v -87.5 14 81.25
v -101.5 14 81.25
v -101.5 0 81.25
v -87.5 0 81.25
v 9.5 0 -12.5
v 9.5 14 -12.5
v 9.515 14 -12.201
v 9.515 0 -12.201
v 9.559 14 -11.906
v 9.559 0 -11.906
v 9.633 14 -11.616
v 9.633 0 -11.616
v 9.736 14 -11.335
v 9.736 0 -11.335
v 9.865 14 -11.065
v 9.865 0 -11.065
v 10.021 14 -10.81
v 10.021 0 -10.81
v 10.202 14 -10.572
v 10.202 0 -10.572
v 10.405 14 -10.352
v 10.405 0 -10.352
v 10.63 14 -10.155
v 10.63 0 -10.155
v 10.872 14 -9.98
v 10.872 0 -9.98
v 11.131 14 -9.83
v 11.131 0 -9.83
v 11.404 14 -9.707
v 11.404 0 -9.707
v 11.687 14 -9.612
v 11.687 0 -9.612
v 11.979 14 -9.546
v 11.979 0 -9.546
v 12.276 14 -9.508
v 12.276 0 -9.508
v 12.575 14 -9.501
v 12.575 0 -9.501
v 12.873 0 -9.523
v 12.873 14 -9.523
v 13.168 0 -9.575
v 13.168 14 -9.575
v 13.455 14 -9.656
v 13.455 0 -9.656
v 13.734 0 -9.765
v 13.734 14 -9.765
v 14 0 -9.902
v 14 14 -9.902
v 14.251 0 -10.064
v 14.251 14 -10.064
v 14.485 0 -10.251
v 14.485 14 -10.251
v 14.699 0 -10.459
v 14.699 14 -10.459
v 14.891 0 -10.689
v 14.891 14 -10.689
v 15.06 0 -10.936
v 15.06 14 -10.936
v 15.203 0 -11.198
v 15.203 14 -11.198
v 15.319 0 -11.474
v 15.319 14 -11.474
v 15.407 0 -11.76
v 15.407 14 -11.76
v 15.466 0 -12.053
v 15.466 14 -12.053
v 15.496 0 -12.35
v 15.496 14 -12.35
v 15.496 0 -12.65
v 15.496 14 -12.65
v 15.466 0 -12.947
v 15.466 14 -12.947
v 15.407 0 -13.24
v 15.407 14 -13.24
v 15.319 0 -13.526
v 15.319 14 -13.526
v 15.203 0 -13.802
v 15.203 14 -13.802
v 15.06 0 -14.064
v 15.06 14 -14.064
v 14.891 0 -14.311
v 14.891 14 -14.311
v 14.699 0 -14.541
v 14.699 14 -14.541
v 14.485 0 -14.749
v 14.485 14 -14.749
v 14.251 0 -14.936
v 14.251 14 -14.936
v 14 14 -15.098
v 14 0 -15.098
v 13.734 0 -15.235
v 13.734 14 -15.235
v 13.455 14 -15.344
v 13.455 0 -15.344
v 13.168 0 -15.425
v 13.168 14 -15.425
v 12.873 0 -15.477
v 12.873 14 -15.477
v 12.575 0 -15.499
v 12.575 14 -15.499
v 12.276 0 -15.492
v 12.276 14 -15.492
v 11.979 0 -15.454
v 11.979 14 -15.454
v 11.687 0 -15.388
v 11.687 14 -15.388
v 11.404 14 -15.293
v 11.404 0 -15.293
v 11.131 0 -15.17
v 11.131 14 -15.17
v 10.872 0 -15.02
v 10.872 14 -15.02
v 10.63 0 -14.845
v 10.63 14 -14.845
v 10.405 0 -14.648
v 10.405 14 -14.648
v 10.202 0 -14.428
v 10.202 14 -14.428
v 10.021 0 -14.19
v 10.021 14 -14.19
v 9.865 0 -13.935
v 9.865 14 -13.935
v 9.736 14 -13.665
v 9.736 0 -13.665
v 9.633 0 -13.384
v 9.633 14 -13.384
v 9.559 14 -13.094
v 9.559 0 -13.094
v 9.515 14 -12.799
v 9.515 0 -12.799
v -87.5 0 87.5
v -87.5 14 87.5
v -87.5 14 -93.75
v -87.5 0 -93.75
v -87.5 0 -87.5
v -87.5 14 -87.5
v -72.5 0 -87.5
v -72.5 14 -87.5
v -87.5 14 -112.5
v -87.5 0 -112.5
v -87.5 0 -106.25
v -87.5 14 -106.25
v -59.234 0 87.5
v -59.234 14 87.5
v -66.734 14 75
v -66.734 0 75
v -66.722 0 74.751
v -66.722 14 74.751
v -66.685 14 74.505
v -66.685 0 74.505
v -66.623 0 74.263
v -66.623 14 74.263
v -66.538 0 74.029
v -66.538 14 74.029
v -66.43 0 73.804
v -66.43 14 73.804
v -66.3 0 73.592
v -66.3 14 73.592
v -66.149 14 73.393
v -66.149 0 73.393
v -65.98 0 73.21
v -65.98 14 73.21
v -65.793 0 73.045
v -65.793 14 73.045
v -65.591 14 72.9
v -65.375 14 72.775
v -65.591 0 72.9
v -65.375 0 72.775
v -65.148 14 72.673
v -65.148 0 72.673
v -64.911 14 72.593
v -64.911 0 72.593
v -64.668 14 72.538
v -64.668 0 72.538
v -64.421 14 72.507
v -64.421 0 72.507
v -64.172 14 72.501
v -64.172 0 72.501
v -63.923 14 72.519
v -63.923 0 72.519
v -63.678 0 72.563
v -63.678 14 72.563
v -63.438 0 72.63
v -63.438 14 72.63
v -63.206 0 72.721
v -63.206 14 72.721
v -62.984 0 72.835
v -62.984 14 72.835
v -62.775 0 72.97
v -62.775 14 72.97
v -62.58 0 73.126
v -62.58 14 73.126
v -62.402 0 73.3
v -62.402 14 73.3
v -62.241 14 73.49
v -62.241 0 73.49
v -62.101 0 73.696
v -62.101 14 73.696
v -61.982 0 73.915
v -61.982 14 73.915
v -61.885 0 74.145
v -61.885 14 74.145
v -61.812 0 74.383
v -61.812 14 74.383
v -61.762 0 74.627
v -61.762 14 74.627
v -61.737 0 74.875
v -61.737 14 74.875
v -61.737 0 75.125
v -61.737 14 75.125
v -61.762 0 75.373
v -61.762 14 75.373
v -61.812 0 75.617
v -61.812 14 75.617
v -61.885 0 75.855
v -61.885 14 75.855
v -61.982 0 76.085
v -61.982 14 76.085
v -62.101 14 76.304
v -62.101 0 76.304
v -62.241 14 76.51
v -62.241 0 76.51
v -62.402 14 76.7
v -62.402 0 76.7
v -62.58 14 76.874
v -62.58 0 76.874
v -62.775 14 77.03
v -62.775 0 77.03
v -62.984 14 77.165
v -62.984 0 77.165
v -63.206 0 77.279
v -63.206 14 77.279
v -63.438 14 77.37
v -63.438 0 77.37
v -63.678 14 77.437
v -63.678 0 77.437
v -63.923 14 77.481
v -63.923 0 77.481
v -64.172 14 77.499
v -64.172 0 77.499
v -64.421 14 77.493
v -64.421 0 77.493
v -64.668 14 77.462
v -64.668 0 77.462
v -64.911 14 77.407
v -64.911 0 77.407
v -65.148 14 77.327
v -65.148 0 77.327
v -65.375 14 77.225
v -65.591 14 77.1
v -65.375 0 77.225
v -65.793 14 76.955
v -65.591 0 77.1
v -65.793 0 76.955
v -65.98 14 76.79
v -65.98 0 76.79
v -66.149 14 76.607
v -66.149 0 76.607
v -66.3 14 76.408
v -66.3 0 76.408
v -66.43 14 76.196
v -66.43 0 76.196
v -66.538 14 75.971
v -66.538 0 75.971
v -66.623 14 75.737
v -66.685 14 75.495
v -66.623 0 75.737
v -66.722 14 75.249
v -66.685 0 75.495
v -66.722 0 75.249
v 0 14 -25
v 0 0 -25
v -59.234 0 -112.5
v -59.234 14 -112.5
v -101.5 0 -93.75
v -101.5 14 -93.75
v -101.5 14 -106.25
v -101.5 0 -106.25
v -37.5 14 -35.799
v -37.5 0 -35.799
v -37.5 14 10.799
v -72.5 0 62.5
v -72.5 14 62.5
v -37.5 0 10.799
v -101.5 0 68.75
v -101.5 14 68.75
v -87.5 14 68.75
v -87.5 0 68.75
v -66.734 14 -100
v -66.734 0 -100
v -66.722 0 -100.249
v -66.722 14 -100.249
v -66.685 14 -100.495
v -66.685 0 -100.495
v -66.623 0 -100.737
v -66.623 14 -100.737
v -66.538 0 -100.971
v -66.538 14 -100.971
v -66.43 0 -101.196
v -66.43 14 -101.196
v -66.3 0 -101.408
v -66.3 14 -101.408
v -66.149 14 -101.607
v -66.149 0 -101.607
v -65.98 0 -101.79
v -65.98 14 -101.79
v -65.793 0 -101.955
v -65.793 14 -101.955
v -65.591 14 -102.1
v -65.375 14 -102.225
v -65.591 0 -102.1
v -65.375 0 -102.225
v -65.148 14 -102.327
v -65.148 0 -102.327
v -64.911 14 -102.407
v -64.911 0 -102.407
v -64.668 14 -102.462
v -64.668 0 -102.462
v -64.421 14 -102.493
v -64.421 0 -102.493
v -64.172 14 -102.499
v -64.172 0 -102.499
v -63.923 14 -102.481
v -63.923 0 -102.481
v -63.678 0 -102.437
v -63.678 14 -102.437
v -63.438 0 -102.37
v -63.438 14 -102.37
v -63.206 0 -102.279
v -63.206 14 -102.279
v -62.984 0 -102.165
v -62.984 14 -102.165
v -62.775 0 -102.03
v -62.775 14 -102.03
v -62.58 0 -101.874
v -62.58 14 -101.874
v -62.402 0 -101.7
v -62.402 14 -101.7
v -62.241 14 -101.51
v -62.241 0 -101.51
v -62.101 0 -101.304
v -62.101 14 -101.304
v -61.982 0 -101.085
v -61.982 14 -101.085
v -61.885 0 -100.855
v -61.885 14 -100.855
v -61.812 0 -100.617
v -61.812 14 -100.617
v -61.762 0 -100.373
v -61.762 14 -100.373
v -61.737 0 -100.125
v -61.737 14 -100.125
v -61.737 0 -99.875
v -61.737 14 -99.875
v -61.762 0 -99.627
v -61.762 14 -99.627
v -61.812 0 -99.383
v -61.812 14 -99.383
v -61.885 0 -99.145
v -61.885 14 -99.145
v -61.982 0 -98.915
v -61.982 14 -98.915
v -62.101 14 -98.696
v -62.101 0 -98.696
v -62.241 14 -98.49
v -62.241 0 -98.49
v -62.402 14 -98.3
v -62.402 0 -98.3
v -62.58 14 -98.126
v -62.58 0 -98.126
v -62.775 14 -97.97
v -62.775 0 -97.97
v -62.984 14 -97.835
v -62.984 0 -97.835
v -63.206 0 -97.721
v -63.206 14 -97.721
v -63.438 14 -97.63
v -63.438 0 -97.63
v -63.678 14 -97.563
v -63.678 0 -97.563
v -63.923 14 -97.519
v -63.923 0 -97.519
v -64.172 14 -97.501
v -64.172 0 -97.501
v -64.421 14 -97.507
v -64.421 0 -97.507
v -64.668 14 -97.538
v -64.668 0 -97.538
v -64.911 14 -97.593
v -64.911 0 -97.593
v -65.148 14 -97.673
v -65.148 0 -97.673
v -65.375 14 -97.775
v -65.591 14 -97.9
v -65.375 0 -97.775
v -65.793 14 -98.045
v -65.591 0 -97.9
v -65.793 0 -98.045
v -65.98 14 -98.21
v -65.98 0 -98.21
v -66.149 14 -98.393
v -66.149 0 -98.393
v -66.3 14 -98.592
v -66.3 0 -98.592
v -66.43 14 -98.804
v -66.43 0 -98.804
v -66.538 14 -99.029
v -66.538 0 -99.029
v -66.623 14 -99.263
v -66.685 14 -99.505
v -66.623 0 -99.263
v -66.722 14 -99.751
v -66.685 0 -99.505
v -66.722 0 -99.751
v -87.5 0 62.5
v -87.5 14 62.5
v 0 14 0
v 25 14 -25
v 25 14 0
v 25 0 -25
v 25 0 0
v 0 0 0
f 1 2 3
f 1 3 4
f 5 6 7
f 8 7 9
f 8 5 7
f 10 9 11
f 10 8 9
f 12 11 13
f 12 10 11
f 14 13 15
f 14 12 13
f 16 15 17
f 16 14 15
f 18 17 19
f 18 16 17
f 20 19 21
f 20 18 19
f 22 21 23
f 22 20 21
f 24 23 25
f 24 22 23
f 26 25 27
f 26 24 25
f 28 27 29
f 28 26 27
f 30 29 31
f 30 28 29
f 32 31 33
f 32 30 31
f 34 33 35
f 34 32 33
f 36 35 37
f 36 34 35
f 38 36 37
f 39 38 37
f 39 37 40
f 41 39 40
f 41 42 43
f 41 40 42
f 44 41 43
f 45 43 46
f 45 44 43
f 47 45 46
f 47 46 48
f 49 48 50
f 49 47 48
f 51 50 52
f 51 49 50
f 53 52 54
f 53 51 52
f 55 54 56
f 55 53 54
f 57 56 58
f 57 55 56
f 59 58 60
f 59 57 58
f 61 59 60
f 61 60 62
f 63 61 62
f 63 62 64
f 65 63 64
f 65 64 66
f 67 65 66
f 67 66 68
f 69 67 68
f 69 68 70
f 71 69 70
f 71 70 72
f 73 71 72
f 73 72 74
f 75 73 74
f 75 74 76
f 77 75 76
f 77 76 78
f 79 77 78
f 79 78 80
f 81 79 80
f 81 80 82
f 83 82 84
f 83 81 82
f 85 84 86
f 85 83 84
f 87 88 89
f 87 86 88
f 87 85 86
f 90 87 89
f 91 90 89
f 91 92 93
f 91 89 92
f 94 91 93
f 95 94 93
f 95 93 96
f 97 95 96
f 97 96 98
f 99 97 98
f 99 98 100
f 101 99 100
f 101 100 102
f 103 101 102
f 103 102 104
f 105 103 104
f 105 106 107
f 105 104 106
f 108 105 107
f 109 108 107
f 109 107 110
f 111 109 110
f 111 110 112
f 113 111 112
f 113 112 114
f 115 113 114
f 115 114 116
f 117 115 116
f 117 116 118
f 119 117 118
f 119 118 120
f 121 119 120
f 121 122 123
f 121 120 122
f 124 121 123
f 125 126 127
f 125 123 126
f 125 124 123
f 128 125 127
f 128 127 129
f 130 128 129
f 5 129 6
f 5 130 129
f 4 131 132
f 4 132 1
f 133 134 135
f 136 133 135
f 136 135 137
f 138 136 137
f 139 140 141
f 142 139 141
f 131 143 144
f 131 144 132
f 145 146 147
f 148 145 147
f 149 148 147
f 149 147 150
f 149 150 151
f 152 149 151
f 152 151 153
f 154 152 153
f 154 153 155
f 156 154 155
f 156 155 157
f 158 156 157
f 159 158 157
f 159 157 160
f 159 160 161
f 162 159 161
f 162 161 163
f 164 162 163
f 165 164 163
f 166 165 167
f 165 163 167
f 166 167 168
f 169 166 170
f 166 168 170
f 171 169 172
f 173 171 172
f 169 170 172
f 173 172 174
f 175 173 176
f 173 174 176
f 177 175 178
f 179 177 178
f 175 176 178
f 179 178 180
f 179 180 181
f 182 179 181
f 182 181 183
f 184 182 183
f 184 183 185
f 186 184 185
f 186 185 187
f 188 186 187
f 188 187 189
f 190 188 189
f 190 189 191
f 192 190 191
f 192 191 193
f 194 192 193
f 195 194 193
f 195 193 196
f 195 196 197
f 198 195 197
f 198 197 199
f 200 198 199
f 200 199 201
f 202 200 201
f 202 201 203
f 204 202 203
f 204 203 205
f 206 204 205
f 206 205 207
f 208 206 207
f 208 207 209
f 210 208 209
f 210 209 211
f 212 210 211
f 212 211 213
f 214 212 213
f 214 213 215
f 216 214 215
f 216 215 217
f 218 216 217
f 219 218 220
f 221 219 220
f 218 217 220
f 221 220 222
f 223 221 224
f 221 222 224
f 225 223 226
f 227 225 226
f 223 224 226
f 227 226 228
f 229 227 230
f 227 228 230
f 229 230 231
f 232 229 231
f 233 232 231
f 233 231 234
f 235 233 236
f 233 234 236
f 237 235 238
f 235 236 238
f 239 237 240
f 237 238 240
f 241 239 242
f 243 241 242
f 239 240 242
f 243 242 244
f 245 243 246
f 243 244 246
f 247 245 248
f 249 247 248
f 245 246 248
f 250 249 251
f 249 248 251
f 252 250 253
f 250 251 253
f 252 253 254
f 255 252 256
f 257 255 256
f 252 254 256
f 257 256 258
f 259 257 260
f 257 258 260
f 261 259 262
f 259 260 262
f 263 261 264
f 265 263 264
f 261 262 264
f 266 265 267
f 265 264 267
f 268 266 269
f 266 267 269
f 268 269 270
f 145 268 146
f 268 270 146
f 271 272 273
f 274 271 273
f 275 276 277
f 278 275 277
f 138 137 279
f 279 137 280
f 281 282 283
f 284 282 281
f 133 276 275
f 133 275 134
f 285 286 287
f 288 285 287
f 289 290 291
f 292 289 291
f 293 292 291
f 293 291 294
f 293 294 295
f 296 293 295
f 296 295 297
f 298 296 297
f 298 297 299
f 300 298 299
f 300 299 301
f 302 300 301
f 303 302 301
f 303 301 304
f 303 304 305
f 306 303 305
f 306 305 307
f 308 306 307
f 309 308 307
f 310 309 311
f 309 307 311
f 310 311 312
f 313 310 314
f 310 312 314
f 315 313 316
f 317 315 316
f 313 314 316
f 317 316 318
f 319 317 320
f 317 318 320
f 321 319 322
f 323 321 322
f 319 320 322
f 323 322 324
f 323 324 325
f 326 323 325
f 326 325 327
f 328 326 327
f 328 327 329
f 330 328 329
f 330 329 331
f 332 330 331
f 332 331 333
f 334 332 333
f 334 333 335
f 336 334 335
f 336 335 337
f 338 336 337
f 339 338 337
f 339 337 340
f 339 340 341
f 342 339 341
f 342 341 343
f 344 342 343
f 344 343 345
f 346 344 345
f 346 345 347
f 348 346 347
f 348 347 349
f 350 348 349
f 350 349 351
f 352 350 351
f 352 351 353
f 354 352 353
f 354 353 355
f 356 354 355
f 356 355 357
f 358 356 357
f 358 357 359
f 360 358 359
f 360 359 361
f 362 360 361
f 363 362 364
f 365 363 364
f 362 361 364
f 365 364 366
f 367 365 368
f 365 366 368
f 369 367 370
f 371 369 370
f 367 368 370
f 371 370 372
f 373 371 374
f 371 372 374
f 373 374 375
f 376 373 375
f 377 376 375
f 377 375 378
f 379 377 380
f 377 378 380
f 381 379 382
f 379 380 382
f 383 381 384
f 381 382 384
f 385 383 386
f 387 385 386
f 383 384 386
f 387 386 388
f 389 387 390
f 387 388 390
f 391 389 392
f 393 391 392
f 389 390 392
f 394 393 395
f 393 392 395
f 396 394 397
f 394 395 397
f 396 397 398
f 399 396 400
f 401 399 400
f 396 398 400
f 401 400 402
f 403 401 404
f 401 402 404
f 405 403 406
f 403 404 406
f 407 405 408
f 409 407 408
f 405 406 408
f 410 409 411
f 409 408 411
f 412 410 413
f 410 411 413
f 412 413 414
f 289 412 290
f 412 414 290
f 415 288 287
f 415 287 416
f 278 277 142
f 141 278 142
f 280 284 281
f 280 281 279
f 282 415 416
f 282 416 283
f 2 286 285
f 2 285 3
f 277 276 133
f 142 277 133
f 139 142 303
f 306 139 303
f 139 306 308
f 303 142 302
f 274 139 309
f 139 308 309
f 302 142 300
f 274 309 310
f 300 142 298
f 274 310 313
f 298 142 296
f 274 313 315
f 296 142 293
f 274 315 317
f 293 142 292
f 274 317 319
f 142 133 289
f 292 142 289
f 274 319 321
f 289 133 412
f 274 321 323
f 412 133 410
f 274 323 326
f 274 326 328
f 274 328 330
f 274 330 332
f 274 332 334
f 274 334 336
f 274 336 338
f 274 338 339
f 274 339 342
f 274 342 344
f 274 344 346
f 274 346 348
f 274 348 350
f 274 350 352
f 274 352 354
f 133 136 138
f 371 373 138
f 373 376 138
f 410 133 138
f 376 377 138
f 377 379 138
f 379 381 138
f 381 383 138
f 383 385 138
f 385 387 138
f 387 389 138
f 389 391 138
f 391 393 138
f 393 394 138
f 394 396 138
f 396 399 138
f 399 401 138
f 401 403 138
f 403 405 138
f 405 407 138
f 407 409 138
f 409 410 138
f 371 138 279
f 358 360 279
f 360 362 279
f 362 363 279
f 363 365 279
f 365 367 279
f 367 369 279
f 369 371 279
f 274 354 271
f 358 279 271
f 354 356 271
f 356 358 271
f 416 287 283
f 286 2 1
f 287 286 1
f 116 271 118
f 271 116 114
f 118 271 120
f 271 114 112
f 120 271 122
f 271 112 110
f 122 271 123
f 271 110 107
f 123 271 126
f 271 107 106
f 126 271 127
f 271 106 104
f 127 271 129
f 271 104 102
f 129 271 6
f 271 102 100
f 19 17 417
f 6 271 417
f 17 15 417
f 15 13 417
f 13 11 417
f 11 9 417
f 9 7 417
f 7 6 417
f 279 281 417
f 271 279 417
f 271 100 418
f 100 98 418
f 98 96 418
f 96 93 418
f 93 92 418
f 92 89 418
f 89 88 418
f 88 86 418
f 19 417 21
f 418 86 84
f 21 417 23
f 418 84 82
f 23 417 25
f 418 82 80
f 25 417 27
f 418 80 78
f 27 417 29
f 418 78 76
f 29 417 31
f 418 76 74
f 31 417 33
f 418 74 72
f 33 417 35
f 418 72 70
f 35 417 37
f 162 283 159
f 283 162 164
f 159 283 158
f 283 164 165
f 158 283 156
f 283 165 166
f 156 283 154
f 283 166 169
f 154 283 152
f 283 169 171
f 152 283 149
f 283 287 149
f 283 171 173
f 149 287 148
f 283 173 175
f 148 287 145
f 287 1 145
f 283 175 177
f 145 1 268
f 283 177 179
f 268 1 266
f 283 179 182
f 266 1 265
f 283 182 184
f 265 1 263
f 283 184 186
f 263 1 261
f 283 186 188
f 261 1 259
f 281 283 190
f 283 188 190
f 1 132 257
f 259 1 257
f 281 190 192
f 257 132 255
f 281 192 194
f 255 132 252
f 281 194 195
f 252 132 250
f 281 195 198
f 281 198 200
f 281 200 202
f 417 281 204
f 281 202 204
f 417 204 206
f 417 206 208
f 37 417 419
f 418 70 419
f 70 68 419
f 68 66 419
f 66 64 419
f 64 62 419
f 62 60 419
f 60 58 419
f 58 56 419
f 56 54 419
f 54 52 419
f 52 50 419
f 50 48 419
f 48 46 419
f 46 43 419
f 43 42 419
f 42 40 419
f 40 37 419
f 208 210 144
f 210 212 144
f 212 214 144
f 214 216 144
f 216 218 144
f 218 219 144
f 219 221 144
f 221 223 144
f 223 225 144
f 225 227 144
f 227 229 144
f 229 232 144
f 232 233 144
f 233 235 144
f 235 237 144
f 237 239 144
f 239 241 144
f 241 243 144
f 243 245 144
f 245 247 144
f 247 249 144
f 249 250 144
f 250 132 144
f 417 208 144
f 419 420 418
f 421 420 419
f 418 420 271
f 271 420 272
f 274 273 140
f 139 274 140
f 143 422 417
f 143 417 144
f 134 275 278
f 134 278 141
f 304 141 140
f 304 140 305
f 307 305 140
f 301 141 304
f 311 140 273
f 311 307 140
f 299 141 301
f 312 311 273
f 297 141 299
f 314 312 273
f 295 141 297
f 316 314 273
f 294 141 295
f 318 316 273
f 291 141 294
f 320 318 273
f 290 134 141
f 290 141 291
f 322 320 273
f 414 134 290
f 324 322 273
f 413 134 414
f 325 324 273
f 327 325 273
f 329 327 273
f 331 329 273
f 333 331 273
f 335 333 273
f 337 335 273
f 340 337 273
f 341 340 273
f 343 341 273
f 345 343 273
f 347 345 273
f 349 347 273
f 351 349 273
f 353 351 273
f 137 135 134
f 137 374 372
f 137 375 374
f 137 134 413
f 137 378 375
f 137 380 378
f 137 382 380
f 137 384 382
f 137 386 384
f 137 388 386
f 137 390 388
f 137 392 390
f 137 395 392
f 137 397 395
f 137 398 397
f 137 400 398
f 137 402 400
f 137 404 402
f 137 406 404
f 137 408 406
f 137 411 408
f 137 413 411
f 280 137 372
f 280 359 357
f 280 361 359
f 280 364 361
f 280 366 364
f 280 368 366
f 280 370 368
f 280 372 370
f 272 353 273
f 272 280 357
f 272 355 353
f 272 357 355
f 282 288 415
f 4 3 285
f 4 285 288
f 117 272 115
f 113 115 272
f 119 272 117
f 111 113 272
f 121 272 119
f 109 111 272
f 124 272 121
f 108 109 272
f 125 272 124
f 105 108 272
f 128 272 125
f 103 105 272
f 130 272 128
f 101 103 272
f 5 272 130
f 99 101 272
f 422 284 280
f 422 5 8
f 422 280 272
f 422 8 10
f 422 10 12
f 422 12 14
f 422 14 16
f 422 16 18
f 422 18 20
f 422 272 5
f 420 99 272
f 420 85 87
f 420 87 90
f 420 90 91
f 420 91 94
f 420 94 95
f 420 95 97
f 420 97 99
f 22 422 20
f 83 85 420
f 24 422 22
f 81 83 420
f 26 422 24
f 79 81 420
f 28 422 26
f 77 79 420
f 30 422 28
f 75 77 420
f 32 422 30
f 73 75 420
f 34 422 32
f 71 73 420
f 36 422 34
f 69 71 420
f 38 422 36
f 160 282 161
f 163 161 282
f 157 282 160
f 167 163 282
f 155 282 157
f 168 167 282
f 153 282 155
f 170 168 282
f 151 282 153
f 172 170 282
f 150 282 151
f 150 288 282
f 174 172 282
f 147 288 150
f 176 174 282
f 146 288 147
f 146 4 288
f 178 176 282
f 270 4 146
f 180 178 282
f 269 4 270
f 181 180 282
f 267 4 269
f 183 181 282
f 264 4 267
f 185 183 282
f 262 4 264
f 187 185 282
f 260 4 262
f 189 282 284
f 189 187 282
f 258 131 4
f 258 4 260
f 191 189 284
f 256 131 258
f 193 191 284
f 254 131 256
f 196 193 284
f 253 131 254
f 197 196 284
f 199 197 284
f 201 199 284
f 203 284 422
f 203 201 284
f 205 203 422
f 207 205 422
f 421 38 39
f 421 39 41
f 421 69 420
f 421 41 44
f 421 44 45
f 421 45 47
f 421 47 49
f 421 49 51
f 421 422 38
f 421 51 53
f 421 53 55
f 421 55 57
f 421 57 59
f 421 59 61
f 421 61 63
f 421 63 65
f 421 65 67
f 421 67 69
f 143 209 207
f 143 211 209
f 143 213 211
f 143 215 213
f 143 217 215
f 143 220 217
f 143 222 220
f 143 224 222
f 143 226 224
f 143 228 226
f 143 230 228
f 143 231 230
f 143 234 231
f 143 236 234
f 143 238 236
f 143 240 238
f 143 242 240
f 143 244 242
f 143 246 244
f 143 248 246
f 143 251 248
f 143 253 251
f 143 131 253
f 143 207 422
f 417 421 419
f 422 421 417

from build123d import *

# Parameters (mm, degrees)
BOSS_EXTRUDE1_DEPTH = 14
SKETCH2_W           = 14
SKETCH2_H           = 12.5
BOSS_EXTRUDE2_DEPTH = 14
HOLE1_D             = 5


with BuildPart() as part:
    # Sketch1 → Boss-Extrude1 (new body)
    with BuildSketch(Plane(origin=(0, 0, 0), x_dir=(1, 0, 0), z_dir=(0, 1, 0))):
        with BuildLine():
            Line((-37.5, 12.5), (9.5, 12.5))
            ThreePointArc((9.5, 12.5), (12.5, 15.5), (15.5, 12.5))
            Line((15.5, 12.5), (25, 12.5))
            Line((25, 12.5), (25, 25))
            Line((25, 25), (0, 25))
            Line((0, 25), (-59.234271291, 112.5))
            Line((-59.234271291, 112.5), (-87.5, 112.5))
            Line((-87.5, 112.5), (-87.5, 87.5))
            Line((-87.5, 87.5), (-72.5, 87.5))
            Line((-72.5, 87.5), (-37.5, 35.798511432))
            Line((-37.5, 35.798511432), (-37.5, 12.5))
        make_face()
    extrude(amount=BOSS_EXTRUDE1_DEPTH)

    # Sketch2 → Boss-Extrude2 (add)
    with BuildSketch(Plane(origin=(0, 14, 0), x_dir=(1, 0, 0), z_dir=(0, 1, 0))):
        with Locations((-94.5, 100)):
            Rectangle(SKETCH2_W, SKETCH2_H)
    extrude(amount=-BOSS_EXTRUDE2_DEPTH)

    # Mirror1: part across plane


with BuildPart() as part_1:
    add(part.part)
    add(part.part.mirror(Plane(origin=(0, 14, -12.5), x_dir=(1, 0, 0), z_dir=(0, 0, -1))))

    # Hole1 (through all)
    with Locations(Plane(origin=(0, 14, 0), x_dir=(1, 0, 0), z_dir=(0, 1, 0))):
        with Locations((-64.234271291, 100), (-64.234271291, -75)):
            Hole(HOLE1_D / 2)


solid = part_1.part
